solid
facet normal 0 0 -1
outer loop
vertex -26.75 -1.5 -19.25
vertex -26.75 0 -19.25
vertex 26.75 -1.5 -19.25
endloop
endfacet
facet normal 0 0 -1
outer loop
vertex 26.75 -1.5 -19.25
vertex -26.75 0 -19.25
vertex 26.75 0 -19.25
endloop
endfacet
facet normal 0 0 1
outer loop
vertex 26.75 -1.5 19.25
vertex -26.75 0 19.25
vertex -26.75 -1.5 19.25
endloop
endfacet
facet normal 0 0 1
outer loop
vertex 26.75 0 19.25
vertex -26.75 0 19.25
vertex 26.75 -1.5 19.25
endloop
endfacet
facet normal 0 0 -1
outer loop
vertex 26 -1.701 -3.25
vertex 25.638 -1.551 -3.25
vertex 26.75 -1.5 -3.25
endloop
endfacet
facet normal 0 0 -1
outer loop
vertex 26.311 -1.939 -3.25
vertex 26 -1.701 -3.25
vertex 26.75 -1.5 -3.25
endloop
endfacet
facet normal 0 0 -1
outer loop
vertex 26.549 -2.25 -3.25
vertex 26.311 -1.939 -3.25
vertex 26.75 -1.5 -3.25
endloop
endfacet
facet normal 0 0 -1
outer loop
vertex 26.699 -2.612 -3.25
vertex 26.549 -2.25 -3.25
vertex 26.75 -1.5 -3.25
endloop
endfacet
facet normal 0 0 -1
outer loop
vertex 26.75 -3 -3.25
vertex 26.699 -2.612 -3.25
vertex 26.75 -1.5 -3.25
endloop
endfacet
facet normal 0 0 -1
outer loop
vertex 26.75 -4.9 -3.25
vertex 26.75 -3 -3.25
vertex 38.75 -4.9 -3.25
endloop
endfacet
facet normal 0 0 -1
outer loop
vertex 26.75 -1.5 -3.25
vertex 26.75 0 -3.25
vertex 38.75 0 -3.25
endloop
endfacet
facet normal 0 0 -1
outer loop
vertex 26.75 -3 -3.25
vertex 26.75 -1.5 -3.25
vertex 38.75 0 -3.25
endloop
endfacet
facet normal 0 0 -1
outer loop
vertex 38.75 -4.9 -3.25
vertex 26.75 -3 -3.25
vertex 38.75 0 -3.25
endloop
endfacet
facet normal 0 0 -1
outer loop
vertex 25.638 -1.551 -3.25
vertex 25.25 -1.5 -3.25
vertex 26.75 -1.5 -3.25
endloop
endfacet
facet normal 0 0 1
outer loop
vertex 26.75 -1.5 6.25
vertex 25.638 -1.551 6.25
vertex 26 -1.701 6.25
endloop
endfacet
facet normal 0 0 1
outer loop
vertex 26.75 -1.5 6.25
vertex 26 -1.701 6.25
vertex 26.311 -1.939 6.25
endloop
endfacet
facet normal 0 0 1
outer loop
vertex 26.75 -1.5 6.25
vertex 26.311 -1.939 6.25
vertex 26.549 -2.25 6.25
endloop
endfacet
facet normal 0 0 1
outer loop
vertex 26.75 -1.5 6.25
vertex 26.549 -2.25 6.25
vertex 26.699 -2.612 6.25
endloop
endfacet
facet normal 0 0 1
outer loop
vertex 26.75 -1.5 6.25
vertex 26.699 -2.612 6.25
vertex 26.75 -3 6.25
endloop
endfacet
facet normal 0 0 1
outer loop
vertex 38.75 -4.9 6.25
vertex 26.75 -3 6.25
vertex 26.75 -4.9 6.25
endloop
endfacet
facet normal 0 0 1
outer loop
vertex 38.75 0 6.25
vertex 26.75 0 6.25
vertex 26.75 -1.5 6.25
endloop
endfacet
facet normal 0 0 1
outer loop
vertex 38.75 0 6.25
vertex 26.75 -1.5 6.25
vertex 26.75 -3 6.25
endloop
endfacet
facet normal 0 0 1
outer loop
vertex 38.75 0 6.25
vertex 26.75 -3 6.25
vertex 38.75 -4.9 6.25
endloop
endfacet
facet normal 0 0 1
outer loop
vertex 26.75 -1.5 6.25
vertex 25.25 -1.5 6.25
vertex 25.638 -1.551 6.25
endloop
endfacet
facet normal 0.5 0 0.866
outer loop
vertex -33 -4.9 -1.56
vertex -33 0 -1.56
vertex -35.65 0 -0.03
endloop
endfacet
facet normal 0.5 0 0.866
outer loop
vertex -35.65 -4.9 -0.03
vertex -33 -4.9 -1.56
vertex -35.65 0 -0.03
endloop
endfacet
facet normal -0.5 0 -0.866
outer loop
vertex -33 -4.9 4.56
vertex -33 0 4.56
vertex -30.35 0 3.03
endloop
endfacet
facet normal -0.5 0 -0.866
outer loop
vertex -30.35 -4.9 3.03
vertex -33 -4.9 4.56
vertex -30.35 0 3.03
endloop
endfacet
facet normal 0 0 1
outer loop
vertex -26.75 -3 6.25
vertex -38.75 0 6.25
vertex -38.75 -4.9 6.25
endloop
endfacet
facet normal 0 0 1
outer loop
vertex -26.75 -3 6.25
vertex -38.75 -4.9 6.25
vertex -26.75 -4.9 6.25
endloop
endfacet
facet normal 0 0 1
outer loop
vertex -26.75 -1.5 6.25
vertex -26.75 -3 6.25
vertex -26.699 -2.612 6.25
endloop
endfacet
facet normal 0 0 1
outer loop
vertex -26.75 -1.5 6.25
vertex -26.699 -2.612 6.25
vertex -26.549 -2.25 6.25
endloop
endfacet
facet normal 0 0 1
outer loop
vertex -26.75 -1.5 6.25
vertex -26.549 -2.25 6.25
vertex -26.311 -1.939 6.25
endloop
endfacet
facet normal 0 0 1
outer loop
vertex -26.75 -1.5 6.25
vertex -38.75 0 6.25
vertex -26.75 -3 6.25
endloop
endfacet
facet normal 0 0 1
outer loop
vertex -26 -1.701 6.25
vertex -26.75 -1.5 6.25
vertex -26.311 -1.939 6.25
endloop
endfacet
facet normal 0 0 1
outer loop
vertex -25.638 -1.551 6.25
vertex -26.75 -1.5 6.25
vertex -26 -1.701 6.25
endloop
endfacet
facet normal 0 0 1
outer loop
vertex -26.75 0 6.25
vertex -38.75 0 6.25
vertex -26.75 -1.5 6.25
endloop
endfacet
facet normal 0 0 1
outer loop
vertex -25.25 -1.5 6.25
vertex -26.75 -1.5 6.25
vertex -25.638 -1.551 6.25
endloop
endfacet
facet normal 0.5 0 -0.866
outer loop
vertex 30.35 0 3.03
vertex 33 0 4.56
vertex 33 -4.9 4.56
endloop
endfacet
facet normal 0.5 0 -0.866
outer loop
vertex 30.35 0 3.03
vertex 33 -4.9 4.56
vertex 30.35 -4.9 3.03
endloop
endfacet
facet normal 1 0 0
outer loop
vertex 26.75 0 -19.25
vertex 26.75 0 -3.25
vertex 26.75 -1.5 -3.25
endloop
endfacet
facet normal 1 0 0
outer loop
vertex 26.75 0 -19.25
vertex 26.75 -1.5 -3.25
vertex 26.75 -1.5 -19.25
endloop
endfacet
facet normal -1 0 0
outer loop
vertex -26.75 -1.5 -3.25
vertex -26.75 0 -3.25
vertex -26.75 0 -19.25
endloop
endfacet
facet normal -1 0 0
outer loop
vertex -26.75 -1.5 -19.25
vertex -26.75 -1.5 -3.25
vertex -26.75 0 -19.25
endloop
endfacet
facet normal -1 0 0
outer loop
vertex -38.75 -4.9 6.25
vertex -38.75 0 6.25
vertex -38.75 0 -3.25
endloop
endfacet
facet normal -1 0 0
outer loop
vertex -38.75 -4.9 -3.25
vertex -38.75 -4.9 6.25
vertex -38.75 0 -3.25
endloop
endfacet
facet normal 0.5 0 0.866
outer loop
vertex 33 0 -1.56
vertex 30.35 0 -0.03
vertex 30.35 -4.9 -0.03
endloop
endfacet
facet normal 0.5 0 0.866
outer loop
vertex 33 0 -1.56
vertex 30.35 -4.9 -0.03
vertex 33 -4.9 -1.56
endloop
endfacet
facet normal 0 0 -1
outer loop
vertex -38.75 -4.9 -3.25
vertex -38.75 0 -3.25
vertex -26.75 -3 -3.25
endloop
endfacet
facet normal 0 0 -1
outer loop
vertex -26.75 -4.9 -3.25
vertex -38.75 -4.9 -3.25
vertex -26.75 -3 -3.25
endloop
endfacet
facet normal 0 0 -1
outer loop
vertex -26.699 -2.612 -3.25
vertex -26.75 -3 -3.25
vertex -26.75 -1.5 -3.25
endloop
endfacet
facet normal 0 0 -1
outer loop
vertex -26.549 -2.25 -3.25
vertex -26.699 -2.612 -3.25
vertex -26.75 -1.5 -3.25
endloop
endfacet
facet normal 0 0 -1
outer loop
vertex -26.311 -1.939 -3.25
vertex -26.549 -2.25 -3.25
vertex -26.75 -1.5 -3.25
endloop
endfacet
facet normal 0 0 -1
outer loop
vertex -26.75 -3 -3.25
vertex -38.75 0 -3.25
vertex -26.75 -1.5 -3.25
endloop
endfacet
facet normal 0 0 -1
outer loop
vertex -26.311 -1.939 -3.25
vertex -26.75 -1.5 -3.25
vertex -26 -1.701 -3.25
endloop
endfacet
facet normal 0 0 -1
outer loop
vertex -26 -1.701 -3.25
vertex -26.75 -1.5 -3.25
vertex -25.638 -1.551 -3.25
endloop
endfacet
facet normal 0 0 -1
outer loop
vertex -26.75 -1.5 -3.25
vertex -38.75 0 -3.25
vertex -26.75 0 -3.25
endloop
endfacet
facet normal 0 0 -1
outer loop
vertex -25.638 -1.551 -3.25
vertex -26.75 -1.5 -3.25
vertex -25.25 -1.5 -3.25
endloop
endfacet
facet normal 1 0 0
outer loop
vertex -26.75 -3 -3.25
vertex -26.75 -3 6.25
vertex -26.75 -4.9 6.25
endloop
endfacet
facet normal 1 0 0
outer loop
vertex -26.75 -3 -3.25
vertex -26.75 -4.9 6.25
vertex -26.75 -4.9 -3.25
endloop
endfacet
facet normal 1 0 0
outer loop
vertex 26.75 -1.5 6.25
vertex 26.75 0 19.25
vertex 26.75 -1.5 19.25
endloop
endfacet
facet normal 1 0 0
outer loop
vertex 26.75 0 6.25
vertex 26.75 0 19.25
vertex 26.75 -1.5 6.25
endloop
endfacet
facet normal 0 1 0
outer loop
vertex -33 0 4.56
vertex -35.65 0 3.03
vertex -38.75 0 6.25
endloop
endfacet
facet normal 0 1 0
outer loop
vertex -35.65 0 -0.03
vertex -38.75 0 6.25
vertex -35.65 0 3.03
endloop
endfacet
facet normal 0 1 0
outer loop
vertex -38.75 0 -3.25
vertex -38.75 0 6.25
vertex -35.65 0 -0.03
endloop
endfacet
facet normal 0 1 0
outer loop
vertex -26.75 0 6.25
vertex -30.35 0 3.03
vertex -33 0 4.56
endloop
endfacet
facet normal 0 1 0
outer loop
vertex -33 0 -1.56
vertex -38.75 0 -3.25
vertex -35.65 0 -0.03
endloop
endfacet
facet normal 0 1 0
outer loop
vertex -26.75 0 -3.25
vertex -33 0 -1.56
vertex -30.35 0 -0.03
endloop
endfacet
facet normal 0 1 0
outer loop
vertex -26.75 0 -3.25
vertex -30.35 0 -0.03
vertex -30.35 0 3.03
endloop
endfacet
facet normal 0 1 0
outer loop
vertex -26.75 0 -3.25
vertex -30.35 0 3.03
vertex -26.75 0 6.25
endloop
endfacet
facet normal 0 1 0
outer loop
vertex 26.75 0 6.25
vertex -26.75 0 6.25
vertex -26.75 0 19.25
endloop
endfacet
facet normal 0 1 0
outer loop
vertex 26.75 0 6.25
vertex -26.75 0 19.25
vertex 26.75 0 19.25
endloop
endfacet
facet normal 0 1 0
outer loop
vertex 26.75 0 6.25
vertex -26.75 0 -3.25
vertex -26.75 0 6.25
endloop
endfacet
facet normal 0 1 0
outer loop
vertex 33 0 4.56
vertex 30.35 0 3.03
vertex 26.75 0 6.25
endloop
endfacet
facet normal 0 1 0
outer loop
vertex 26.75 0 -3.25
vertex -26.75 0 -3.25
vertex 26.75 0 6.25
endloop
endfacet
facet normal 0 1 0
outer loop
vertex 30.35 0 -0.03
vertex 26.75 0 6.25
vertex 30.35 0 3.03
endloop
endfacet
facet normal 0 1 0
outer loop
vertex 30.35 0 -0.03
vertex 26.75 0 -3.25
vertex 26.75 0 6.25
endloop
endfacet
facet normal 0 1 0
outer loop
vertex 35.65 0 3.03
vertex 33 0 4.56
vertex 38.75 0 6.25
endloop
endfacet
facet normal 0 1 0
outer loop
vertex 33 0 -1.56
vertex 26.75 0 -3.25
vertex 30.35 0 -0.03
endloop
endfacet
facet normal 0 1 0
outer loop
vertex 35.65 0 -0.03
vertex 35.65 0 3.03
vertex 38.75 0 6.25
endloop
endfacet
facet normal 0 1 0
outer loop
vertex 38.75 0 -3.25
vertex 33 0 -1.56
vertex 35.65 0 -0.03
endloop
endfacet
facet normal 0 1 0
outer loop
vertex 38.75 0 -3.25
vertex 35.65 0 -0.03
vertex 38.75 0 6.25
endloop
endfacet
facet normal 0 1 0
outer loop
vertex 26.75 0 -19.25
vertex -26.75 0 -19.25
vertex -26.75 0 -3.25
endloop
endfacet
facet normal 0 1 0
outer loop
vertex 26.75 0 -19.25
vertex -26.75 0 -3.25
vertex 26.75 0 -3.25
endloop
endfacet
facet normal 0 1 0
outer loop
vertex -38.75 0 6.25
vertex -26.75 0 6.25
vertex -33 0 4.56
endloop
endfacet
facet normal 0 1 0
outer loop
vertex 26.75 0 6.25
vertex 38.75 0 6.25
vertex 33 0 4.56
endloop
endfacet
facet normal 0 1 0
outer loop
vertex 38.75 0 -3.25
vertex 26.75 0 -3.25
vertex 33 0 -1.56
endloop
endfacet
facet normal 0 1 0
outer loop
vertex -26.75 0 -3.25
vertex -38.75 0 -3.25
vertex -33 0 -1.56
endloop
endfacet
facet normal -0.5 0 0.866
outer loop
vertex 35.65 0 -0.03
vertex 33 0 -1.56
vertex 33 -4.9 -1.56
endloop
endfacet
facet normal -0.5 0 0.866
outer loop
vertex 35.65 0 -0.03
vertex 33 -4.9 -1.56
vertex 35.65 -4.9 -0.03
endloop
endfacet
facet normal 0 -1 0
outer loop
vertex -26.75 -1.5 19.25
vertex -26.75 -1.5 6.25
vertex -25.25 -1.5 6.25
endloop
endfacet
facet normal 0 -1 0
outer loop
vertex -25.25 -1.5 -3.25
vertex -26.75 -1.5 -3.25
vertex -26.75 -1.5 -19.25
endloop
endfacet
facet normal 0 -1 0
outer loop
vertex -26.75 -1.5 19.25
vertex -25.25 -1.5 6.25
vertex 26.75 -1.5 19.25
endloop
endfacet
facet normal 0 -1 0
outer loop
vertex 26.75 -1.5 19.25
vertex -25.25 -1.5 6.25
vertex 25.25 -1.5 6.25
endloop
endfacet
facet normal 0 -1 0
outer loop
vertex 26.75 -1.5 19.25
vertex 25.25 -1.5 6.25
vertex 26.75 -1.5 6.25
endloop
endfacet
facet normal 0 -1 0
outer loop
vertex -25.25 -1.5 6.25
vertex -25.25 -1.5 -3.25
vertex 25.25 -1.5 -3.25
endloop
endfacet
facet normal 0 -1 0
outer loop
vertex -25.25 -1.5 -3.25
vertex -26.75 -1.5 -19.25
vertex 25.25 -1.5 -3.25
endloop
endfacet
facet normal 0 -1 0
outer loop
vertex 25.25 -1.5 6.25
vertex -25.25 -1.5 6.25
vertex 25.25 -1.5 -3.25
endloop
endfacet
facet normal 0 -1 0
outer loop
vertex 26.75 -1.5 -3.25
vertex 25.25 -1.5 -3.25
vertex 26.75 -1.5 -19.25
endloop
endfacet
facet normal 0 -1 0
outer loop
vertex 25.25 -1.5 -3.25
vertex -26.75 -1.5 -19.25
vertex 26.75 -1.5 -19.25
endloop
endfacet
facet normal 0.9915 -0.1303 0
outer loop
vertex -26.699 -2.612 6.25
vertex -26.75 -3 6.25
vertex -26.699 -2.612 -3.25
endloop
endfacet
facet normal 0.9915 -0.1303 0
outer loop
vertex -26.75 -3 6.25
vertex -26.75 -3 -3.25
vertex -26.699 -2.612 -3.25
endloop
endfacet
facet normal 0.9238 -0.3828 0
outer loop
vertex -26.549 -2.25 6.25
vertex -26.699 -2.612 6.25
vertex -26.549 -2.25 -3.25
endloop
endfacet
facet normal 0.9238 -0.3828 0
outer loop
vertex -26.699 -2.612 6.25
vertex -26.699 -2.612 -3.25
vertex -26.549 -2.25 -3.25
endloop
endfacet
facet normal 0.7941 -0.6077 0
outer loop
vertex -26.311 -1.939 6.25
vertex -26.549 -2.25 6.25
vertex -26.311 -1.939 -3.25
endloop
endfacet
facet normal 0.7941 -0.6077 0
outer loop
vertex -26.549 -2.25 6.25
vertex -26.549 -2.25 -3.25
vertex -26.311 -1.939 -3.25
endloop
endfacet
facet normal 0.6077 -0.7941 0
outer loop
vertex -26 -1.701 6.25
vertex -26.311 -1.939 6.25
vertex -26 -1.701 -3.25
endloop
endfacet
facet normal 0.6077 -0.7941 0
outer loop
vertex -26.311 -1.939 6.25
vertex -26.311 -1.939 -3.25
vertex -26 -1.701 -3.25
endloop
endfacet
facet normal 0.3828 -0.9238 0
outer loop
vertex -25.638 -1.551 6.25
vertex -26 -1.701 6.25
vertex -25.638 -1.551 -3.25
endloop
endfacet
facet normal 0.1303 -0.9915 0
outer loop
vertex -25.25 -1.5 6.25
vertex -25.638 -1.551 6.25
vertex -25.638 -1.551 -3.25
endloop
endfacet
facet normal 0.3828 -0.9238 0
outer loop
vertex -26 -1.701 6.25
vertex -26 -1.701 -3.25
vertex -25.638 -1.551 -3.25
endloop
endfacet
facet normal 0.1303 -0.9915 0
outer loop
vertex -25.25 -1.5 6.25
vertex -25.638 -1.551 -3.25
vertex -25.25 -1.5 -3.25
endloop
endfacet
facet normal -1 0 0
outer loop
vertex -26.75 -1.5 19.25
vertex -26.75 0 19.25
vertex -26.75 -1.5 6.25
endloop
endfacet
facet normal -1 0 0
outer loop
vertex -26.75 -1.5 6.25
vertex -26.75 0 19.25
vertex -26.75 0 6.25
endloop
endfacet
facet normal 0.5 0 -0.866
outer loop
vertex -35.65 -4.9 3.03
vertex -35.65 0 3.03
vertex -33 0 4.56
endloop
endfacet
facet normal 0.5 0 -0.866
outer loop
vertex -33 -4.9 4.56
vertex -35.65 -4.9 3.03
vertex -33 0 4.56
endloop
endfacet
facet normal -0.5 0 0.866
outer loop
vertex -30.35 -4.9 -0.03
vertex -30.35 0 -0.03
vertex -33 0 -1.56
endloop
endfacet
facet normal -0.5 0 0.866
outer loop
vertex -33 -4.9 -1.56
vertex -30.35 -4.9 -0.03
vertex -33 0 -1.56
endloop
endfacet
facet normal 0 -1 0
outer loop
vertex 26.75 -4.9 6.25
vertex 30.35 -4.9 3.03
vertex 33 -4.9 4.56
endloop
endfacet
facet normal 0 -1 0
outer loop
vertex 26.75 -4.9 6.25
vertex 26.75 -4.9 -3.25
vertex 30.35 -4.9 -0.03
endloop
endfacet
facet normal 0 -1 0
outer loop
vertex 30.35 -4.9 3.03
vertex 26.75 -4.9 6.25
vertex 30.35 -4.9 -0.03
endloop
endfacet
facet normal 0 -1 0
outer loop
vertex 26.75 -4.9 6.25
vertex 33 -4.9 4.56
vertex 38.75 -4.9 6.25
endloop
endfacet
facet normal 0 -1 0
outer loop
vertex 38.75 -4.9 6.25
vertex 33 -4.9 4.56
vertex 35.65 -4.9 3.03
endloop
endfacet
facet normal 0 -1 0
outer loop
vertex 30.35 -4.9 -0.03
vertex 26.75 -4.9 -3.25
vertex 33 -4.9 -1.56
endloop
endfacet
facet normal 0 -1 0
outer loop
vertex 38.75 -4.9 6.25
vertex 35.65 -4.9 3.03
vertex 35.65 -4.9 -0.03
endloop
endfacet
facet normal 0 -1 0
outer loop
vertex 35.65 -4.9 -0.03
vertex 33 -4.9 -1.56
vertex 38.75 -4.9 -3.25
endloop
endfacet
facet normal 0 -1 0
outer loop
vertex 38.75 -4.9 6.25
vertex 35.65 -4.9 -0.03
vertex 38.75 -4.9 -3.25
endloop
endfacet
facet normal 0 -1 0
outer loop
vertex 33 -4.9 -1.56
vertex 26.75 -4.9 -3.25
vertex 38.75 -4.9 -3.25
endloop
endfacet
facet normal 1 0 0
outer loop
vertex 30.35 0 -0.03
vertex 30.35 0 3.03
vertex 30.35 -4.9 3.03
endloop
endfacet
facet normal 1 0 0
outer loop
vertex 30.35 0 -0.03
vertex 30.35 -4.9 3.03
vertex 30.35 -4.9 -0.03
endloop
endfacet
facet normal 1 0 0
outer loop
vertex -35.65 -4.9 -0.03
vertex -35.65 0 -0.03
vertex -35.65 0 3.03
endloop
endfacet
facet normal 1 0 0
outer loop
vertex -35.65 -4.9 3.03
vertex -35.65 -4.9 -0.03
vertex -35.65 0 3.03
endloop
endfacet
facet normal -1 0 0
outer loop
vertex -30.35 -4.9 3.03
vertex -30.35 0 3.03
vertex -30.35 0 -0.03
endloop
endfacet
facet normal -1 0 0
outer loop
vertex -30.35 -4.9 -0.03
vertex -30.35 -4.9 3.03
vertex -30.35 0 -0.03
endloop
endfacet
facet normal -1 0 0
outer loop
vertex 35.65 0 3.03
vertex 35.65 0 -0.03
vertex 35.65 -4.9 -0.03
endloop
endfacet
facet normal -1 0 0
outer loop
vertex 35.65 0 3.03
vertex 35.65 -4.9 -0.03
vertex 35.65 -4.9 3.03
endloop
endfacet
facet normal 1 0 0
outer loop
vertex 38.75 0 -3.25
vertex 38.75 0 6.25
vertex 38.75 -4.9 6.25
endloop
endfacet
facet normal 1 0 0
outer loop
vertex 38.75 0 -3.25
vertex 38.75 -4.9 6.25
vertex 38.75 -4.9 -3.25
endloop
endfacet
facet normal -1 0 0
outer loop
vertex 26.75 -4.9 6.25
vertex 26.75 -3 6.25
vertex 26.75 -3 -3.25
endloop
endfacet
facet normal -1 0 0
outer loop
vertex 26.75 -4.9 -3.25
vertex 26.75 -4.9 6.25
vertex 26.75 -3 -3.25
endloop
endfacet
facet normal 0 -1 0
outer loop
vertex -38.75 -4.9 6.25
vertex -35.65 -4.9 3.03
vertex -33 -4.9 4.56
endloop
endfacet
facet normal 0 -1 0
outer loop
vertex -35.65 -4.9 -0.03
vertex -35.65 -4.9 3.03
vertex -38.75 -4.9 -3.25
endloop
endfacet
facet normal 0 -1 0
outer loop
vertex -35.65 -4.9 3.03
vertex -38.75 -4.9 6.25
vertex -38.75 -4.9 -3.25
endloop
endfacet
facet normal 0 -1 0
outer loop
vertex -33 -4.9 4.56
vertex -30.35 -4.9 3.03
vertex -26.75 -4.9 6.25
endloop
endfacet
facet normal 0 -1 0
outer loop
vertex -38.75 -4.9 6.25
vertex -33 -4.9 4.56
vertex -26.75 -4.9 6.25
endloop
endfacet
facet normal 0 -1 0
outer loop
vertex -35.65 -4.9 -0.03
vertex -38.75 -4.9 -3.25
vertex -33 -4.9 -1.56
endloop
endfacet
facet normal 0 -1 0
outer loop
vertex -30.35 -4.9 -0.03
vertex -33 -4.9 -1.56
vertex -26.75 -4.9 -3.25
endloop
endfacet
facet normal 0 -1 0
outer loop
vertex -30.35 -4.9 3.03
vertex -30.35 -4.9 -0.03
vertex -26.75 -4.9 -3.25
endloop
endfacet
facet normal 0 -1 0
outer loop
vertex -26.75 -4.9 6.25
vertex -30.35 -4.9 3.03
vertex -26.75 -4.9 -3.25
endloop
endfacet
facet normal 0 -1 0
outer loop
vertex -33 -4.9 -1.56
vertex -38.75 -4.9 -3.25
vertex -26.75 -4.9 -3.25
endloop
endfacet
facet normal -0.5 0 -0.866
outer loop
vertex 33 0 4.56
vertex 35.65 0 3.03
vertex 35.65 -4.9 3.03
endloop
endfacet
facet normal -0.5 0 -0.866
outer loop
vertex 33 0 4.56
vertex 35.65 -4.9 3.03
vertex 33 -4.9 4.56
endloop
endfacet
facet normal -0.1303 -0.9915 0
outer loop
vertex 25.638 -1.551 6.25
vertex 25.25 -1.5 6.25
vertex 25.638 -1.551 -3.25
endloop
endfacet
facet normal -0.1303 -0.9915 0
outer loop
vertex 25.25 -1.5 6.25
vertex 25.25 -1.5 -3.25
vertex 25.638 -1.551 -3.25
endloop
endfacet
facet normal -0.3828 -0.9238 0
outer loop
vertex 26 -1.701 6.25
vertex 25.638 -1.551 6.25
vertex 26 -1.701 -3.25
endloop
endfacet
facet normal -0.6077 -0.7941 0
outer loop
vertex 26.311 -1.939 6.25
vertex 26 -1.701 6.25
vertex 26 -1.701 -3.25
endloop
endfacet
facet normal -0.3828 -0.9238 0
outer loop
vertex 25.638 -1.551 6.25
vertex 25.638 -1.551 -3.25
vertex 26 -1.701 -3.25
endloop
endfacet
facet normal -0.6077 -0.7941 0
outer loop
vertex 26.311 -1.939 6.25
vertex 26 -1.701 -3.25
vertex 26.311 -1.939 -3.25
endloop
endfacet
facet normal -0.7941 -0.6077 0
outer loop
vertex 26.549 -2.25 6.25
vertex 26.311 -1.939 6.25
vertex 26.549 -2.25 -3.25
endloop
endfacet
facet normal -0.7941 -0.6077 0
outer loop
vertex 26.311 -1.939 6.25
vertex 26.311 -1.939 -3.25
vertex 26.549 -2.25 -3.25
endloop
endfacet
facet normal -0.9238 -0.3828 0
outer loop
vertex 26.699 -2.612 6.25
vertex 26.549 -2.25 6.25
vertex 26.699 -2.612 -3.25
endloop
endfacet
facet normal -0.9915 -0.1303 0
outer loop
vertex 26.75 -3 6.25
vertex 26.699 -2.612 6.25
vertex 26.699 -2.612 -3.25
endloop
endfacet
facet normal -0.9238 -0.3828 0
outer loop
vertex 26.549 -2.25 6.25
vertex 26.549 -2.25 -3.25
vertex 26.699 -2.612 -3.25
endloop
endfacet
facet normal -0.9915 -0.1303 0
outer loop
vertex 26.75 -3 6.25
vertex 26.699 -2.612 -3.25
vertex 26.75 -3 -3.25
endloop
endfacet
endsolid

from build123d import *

# Parameters (mm, degrees)
SKETCH1_W           = 53.5
SKETCH1_H           = 38.5
BOSS_EXTRUDE1_DEPTH = 1.5
SKETCH2_W           = 12
SKETCH2_H           = 9.5
BOSS_EXTRUDE2_DEPTH = 4.9
FILLET1_R           = 1.5


with BuildPart() as part:
    # Sketch1 → Boss-Extrude1 (new body)
    with BuildSketch(Plane(origin=(0, 0, 0), x_dir=(1, 0, 0), z_dir=(0, 1, 0))):
        Rectangle(SKETCH1_W, SKETCH1_H)
    extrude(amount=-BOSS_EXTRUDE1_DEPTH)

    # Sketch2 → Boss-Extrude2 (add)
    # profile 1 of 2: a face of its own
    with BuildSketch(Plane(origin=(0, 0, 0), x_dir=(1, 0, 0), z_dir=(0, 1, 0))):
        with Locations((-32.75, -1.5)):
            Rectangle(SKETCH2_W, SKETCH2_H)
        Polygon((-33, -4.559956427), (-30.35, -3.029978213), (-30.35, 0.029978213), (-33, 1.559956427), (-35.65, 0.029978213), (-35.65, -3.029978213), align=None, mode=Mode.SUBTRACT)
    # profile 2 of 2: a face of its own
    with BuildSketch(Plane(origin=(0, 0, 0), x_dir=(1, 0, 0), z_dir=(0, 1, 0))):
        with Locations((32.75, -1.5)):
            Rectangle(SKETCH2_W, SKETCH2_H)
        Polygon((35.65, -3.029978213), (33, -4.559956427), (30.35, -3.029978213), (30.35, 0.029978213), (33, 1.559956427), (35.65, 0.029978213), align=None, mode=Mode.SUBTRACT)
    extrude(amount=-BOSS_EXTRUDE2_DEPTH)

    # Fillet1
    fillet1_edges = [part.edges().sort_by_distance(p)[0] for p in [
        (-26.75, -1.5, 1.5),
        (26.75, -1.5, 1.5),
    ]]
    fillet(fillet1_edges, radius=FILLET1_R)


solid = part.part
